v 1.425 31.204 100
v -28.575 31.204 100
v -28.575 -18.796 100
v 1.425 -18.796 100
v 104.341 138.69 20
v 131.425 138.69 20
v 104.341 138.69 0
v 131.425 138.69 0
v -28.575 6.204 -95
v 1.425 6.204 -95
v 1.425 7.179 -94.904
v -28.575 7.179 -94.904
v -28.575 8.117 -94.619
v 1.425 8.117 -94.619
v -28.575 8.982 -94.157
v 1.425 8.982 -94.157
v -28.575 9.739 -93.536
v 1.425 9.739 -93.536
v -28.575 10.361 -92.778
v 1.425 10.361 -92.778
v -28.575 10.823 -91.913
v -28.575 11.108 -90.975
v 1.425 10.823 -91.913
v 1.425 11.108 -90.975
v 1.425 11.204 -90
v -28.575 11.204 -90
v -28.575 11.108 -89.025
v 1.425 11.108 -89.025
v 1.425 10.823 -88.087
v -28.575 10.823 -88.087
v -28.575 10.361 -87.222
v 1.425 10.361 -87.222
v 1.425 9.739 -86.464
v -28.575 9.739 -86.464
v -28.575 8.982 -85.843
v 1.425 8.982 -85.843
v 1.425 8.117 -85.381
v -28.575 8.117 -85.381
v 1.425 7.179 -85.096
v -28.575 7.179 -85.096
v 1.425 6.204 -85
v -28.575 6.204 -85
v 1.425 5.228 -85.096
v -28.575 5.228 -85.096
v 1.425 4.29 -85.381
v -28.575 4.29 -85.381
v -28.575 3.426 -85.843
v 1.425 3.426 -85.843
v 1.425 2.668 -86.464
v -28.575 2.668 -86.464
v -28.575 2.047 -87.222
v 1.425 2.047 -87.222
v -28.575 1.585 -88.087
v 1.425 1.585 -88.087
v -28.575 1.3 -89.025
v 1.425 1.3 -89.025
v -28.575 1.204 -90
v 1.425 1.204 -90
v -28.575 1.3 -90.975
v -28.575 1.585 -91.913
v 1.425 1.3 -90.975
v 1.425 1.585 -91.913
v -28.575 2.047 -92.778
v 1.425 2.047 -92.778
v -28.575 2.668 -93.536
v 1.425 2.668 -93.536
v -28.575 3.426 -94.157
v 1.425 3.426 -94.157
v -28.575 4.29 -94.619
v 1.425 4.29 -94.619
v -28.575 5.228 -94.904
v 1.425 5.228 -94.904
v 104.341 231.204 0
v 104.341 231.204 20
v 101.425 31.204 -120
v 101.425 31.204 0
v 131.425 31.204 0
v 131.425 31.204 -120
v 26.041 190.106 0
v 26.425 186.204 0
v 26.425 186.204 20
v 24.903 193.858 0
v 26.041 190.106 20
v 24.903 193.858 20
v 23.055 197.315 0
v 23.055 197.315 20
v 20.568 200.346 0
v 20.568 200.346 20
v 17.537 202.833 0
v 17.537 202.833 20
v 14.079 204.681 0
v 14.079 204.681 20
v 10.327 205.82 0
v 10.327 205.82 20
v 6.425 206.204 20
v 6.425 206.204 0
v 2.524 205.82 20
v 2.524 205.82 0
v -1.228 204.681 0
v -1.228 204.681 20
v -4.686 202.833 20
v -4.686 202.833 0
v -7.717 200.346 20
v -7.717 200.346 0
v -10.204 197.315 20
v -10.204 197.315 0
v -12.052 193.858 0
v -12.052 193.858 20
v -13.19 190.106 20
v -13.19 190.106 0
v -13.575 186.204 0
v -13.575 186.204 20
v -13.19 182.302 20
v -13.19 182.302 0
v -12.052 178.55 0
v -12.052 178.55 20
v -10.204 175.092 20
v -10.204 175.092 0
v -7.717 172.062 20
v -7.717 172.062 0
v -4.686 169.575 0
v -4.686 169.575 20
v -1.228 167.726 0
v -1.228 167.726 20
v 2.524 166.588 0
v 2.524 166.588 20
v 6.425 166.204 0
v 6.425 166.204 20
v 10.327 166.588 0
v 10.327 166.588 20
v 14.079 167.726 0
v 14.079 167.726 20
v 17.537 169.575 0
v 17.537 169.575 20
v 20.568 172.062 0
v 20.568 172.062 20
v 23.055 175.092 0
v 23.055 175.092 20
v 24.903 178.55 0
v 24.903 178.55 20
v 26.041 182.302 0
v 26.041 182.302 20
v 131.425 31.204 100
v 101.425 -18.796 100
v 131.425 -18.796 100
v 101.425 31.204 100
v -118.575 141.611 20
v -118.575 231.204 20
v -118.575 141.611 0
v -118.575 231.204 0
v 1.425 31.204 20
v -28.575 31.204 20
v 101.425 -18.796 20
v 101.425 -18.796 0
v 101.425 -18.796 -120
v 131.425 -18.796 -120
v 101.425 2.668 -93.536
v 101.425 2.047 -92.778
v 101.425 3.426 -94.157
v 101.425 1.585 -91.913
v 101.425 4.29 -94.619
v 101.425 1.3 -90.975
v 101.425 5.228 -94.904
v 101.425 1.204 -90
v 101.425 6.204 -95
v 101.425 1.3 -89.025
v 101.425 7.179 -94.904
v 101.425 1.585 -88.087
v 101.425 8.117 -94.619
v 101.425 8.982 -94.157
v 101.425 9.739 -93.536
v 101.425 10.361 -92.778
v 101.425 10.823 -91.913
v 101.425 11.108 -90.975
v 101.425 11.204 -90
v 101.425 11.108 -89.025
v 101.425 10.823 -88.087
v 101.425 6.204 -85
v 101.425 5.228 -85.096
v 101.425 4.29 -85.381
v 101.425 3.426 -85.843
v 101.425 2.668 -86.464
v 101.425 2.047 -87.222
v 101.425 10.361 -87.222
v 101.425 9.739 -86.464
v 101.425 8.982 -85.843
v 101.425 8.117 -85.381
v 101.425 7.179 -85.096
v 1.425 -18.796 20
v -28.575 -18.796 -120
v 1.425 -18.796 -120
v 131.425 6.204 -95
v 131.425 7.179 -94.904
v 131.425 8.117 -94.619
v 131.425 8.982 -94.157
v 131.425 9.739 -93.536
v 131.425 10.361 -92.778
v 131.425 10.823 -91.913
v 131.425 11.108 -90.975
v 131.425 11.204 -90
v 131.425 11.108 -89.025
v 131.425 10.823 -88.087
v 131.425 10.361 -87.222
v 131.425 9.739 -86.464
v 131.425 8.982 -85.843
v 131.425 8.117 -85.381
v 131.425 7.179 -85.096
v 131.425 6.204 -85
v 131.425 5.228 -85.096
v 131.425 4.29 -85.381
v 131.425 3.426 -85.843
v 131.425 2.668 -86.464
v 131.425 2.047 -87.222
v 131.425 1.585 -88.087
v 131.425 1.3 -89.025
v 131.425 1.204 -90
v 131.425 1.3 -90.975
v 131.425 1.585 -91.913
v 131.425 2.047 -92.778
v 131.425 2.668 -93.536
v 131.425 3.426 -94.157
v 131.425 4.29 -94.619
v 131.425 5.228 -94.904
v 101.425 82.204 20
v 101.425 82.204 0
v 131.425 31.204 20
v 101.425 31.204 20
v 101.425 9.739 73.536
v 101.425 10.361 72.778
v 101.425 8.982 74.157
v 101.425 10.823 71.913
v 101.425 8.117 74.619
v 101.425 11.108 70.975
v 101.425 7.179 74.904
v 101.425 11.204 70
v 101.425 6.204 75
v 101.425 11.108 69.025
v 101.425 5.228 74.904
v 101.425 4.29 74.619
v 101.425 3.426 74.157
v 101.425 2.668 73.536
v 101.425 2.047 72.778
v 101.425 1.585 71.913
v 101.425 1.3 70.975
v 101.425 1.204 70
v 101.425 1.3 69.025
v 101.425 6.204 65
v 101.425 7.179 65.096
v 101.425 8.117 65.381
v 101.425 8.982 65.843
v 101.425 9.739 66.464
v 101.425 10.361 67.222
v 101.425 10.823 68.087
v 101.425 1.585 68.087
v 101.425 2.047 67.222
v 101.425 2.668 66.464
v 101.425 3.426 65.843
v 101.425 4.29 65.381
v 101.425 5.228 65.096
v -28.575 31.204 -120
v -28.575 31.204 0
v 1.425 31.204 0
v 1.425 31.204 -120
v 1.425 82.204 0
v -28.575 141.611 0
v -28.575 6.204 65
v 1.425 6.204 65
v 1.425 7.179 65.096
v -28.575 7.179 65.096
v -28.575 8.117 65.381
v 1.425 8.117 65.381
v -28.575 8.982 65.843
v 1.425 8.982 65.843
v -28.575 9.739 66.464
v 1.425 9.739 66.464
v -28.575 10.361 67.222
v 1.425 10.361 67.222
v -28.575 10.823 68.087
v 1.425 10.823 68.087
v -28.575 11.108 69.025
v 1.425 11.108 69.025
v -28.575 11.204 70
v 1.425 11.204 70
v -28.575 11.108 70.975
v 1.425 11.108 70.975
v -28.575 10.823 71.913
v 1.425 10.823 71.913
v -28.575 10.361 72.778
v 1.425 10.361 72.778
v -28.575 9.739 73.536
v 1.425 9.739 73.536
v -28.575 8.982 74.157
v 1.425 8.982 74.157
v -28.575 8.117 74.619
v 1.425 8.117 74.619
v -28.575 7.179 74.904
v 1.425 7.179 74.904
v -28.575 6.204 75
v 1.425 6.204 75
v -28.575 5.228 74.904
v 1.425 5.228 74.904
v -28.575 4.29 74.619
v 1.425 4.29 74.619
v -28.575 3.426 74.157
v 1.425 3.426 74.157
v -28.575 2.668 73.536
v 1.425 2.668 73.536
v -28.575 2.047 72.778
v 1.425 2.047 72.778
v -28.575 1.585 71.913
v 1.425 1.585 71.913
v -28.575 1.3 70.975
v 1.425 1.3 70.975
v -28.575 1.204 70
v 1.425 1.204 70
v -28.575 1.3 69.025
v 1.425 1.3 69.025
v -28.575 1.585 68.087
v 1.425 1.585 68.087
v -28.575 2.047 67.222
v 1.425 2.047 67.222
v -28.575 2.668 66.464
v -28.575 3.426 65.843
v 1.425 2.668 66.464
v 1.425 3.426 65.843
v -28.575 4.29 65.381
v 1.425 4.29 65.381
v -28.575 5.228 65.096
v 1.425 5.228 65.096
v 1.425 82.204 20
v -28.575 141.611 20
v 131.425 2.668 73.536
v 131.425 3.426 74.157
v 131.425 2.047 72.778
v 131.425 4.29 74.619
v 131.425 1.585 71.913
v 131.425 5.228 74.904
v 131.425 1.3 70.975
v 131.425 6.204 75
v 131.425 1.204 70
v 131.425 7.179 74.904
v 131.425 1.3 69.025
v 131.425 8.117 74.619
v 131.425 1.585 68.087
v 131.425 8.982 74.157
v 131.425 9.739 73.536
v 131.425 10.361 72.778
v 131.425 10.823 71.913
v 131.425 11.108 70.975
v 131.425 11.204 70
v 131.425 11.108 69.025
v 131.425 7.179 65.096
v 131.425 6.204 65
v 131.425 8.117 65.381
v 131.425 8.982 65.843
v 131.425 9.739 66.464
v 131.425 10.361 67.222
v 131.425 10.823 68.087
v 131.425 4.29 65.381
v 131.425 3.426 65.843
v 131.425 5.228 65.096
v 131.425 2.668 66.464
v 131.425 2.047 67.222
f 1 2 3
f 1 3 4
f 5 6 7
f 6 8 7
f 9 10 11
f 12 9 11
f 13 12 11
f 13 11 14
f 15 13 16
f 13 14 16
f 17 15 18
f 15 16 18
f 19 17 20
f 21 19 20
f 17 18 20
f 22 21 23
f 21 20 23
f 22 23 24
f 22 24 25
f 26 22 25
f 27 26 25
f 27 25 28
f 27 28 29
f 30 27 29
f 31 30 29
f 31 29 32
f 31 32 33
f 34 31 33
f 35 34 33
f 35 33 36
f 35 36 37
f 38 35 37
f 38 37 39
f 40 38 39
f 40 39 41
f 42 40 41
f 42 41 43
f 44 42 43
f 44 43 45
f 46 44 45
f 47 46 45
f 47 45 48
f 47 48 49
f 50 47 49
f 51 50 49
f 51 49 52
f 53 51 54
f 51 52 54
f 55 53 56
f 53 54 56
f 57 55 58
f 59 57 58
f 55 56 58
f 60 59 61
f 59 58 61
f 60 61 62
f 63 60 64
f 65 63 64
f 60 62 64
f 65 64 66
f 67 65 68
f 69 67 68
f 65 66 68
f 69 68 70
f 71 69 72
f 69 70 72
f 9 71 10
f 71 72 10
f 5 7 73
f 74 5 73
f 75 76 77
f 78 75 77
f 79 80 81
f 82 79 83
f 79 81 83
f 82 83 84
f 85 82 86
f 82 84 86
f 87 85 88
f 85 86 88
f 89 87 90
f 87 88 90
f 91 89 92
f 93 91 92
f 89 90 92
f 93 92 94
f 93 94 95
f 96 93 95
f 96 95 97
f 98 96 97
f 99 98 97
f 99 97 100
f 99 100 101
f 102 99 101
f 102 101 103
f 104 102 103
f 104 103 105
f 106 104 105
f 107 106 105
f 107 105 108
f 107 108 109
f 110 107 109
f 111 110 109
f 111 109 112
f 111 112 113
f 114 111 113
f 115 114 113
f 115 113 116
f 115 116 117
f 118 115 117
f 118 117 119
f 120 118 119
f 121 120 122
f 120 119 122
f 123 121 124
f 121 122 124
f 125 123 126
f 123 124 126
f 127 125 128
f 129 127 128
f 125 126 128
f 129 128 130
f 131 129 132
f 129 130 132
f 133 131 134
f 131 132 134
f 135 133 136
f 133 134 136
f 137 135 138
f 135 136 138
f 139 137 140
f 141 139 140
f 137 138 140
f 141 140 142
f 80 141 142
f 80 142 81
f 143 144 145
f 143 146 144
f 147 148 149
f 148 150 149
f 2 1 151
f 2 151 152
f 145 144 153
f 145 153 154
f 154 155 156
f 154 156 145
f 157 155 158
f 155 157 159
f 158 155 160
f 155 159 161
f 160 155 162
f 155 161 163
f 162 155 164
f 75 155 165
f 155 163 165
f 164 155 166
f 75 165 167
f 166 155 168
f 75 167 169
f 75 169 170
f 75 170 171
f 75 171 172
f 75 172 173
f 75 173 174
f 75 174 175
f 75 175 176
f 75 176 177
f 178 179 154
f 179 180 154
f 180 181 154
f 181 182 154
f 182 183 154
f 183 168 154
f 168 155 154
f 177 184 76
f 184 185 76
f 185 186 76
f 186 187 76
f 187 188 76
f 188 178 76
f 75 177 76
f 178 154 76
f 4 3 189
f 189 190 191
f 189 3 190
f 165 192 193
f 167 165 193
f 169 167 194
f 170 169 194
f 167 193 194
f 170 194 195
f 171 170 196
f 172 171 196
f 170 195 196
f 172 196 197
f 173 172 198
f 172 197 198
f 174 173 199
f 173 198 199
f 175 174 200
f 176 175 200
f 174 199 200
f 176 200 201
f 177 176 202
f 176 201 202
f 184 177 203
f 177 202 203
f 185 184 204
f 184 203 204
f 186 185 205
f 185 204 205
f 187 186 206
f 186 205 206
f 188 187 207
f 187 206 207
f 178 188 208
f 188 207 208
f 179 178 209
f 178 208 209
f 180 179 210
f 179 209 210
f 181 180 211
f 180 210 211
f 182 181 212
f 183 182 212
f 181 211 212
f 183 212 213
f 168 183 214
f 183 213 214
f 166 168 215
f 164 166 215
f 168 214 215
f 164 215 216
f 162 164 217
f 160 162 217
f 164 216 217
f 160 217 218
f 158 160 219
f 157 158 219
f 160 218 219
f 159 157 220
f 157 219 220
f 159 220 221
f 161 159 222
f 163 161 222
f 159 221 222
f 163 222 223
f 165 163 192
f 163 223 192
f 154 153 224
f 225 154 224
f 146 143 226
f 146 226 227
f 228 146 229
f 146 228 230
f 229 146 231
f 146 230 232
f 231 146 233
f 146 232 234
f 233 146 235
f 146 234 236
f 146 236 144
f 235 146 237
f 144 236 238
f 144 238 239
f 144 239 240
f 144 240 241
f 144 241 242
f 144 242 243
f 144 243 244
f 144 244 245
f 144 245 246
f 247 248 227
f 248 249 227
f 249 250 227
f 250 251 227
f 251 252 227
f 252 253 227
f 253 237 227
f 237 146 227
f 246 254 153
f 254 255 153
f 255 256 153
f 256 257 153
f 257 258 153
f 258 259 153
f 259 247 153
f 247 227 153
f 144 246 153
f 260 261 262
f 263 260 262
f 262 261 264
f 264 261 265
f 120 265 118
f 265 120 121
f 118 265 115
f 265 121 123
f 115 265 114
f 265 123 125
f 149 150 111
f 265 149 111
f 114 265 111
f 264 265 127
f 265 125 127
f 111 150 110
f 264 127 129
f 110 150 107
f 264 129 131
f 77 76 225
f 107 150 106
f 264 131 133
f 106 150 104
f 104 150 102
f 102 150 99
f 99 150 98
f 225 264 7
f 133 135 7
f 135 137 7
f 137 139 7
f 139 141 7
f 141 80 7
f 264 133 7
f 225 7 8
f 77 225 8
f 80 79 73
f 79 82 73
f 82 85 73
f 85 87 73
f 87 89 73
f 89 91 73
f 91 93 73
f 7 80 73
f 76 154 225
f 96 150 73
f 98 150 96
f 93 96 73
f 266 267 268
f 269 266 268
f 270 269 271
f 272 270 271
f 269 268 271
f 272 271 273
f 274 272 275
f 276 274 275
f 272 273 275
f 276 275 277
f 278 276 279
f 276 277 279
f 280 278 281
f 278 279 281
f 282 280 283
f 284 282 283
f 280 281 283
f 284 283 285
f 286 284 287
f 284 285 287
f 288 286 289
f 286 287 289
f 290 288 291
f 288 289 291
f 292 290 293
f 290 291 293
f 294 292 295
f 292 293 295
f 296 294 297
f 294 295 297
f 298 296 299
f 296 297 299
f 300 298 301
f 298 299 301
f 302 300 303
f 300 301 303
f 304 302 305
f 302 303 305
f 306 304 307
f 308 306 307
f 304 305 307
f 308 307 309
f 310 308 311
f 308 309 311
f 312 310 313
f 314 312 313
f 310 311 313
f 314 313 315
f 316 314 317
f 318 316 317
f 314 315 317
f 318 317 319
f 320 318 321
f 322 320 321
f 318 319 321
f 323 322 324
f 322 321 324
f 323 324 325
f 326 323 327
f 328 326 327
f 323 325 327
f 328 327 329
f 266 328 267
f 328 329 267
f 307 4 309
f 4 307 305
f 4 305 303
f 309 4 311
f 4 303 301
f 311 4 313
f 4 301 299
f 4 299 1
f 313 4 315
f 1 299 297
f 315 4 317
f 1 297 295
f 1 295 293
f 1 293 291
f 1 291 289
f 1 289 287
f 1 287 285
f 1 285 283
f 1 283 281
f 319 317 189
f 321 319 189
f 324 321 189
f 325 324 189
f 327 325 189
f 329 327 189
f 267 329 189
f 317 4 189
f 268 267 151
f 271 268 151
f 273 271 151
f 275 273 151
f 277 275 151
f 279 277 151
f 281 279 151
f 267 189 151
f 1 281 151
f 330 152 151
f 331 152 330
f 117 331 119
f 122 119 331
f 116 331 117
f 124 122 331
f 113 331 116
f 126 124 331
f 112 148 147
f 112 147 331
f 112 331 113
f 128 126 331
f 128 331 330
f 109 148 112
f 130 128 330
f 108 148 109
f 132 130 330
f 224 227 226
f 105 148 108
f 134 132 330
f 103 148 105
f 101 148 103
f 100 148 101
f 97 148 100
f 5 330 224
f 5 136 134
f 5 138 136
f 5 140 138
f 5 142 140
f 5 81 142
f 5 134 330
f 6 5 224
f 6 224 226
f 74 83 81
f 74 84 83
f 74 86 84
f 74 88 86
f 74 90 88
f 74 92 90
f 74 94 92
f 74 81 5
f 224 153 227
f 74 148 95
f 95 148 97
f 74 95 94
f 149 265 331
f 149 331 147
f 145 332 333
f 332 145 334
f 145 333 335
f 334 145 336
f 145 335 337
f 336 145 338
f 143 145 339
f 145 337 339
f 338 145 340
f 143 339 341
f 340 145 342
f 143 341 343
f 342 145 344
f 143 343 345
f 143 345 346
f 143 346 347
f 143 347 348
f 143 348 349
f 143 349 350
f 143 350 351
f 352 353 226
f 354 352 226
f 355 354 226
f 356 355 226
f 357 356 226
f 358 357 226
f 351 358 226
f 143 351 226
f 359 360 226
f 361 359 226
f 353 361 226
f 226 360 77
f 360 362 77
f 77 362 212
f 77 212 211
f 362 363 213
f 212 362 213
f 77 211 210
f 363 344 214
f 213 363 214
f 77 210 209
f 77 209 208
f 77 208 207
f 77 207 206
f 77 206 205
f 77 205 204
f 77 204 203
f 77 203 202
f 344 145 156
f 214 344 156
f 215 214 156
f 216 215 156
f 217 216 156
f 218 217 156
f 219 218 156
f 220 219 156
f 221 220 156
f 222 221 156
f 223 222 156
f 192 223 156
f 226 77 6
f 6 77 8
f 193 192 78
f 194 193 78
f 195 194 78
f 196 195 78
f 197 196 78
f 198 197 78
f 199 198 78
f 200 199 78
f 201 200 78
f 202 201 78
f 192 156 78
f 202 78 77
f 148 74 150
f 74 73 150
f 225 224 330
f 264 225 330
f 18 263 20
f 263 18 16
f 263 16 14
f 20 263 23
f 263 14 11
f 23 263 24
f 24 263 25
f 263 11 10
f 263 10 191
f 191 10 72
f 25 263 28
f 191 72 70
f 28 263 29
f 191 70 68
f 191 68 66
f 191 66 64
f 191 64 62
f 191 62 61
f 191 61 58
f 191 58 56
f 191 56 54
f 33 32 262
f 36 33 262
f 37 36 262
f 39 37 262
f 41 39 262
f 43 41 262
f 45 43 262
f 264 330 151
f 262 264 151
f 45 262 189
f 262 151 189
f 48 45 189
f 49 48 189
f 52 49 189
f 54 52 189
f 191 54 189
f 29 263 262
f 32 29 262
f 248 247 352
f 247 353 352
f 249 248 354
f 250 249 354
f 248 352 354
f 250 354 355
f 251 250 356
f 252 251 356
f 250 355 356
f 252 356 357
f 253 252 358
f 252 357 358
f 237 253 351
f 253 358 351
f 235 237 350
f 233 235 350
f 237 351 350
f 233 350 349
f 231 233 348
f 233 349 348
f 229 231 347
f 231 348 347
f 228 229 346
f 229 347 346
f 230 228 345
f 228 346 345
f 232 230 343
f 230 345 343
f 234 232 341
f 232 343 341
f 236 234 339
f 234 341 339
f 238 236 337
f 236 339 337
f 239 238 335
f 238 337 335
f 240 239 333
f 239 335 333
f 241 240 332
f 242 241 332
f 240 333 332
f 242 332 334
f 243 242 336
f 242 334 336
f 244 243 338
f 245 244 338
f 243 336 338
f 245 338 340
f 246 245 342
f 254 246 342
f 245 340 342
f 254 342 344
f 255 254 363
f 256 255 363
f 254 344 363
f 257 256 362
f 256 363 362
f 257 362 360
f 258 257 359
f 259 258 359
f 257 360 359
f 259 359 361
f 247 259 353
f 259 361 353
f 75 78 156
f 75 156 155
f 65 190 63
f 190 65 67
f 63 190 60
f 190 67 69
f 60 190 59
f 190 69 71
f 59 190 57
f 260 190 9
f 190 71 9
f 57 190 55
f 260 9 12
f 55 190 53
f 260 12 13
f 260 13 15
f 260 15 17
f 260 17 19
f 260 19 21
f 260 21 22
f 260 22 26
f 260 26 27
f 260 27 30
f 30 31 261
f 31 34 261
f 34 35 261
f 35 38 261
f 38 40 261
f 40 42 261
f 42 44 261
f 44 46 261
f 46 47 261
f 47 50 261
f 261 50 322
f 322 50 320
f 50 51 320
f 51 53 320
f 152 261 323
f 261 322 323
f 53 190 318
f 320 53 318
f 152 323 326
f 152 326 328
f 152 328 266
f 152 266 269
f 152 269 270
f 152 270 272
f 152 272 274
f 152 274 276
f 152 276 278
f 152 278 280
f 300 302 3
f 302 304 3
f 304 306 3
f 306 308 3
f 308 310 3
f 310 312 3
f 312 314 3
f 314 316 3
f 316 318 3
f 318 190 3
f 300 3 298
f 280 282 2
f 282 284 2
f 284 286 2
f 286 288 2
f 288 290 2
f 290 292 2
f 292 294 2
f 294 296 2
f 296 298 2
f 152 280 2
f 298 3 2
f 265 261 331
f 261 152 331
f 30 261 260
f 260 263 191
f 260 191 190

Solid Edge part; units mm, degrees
sketch "Sketch1" plane through (0, 0, 0) normal (0, 0, 1) x (1, 0, 0)
  line L0 (-118.5746, -18.7961) -> (131.4254, -18.7961)
  line L1 (131.4254, -18.7961) -> (131.4254, 231.2039)
  line L2 (131.4254, 231.2039) -> (-118.5746, 231.2039)
  line L3 (-118.5746, 231.2039) -> (-118.5746, -18.7961)
  dimension "D1" = 250
  dimension "D2" = 250
extrude "Protrusion1" add sketch "Sketch1" along normal blind 20
sketch "Sketch2" plane through (-18.5746, 131.2039, 20) normal (0, 0, 1) x (1, 0, 0)
  circle A0 centre (25, 55) radius 20
  dimension "D1" = 45
extrude "Cutout1" cut sketch "Sketch2" against normal through all
sketch "Sketch3" plane through (31.4254, 131.2039, 0) normal (0, 0, -1) x (1, 0, 0)
  line L0 (100, 150) -> (70, 150)
  line L1 (70, 150) -> (70, 100)
  line L2 (70, 100) -> (100, 100)
  line L3 (100, 100) -> (100, 150)
  line L4 (-60, 150) -> (-60, 100)
  line L5 (-60, 100) -> (-30, 100)
  line L6 (-30, 100) -> (-30, 150)
  line L7 (-30, 150) -> (-60, 150)
  dimension "D1" = 50
  dimension "D2" = 50
  dimension "D3" = 30
  dimension "D4" = 100
  dimension "D5" = 30
extrude "ExtrudedProtrusion_2" add sketch "Sketch3" along normal blind 120
sketch "Sketch4" plane through (31.4254, 131.2039, 20) normal (0, 0, 1) x (-1, 0, 0)
  line L0 (30, 100) -> (60, 100)
  line L1 (60, 100) -> (60, 150)
  line L2 (60, 150) -> (30, 150)
  line L3 (30, 150) -> (30, 100)
  line L4 (-100, 150) -> (-100, 100)
  line L5 (-100, 100) -> (-70, 100)
  line L6 (-70, 100) -> (-70, 150)
  line L7 (-70, 150) -> (-100, 150)
  dimension "D1" = 30
  dimension "D2" = 50
  dimension "D3" = 50
  dimension "D4" = 30
  dimension "D5" = 100
  dimension "D6" = 30
extrude "ExtrudedProtrusion_4" add sketch "Sketch4" along normal blind 80
sketch "Sketch5" plane through (131.4254, 86.2039, 10) normal (1, 0, 0) x (0, 0, -1)
  circle A0 centre (100, -80) radius 5
  circle A1 centre (-60, -80) radius 5
  dimension "D1" = 100
  dimension "D2" = 160
extrude "Cutout2" cut sketch "Sketch5" against normal through all
sketch "Sketch6" plane through (31.4253, 131.2038, 20) normal (0, 0, 1) x (-1, 0, 0)
  line L0 (-70, 150) -> (-70, 49)
  line L1 (-70, 49) -> (30, 49)
  line L2 (30, 49) -> (30, 150)
  line L3 (30, 150) -> (-70, 150)
  dimension "D1" = 100
  dimension "D2" = 101
extrude "Cutout3" cut sketch "Sketch6" against normal through all
sketch "Sketch7" plane through (6.4254, 106.2039, 0) normal (0, 0, -1) x (-1, 0, 0)
  line L0 (-97.9157, 32.4862) -> (-97.9157, 129.3887)
  line L1 (-97.9157, 129.3887) -> (-214.4606, 129.3887)
  line L2 (-214.4606, 129.3887) -> (-214.4606, 32.4862)
  line L3 (-214.4606, 32.4862) -> (-97.9157, 32.4862)
  line L4 (35, -125) -> (35, 35.407)
  line L5 (35, 35.407) -> (133.9057, 35.407)
  line L6 (133.9057, 35.407) -> (133.9057, -125)
  line L7 (133.9057, -125) -> (35, -125)
extrude "Cutout4" cut sketch "Sketch7" against normal through all
